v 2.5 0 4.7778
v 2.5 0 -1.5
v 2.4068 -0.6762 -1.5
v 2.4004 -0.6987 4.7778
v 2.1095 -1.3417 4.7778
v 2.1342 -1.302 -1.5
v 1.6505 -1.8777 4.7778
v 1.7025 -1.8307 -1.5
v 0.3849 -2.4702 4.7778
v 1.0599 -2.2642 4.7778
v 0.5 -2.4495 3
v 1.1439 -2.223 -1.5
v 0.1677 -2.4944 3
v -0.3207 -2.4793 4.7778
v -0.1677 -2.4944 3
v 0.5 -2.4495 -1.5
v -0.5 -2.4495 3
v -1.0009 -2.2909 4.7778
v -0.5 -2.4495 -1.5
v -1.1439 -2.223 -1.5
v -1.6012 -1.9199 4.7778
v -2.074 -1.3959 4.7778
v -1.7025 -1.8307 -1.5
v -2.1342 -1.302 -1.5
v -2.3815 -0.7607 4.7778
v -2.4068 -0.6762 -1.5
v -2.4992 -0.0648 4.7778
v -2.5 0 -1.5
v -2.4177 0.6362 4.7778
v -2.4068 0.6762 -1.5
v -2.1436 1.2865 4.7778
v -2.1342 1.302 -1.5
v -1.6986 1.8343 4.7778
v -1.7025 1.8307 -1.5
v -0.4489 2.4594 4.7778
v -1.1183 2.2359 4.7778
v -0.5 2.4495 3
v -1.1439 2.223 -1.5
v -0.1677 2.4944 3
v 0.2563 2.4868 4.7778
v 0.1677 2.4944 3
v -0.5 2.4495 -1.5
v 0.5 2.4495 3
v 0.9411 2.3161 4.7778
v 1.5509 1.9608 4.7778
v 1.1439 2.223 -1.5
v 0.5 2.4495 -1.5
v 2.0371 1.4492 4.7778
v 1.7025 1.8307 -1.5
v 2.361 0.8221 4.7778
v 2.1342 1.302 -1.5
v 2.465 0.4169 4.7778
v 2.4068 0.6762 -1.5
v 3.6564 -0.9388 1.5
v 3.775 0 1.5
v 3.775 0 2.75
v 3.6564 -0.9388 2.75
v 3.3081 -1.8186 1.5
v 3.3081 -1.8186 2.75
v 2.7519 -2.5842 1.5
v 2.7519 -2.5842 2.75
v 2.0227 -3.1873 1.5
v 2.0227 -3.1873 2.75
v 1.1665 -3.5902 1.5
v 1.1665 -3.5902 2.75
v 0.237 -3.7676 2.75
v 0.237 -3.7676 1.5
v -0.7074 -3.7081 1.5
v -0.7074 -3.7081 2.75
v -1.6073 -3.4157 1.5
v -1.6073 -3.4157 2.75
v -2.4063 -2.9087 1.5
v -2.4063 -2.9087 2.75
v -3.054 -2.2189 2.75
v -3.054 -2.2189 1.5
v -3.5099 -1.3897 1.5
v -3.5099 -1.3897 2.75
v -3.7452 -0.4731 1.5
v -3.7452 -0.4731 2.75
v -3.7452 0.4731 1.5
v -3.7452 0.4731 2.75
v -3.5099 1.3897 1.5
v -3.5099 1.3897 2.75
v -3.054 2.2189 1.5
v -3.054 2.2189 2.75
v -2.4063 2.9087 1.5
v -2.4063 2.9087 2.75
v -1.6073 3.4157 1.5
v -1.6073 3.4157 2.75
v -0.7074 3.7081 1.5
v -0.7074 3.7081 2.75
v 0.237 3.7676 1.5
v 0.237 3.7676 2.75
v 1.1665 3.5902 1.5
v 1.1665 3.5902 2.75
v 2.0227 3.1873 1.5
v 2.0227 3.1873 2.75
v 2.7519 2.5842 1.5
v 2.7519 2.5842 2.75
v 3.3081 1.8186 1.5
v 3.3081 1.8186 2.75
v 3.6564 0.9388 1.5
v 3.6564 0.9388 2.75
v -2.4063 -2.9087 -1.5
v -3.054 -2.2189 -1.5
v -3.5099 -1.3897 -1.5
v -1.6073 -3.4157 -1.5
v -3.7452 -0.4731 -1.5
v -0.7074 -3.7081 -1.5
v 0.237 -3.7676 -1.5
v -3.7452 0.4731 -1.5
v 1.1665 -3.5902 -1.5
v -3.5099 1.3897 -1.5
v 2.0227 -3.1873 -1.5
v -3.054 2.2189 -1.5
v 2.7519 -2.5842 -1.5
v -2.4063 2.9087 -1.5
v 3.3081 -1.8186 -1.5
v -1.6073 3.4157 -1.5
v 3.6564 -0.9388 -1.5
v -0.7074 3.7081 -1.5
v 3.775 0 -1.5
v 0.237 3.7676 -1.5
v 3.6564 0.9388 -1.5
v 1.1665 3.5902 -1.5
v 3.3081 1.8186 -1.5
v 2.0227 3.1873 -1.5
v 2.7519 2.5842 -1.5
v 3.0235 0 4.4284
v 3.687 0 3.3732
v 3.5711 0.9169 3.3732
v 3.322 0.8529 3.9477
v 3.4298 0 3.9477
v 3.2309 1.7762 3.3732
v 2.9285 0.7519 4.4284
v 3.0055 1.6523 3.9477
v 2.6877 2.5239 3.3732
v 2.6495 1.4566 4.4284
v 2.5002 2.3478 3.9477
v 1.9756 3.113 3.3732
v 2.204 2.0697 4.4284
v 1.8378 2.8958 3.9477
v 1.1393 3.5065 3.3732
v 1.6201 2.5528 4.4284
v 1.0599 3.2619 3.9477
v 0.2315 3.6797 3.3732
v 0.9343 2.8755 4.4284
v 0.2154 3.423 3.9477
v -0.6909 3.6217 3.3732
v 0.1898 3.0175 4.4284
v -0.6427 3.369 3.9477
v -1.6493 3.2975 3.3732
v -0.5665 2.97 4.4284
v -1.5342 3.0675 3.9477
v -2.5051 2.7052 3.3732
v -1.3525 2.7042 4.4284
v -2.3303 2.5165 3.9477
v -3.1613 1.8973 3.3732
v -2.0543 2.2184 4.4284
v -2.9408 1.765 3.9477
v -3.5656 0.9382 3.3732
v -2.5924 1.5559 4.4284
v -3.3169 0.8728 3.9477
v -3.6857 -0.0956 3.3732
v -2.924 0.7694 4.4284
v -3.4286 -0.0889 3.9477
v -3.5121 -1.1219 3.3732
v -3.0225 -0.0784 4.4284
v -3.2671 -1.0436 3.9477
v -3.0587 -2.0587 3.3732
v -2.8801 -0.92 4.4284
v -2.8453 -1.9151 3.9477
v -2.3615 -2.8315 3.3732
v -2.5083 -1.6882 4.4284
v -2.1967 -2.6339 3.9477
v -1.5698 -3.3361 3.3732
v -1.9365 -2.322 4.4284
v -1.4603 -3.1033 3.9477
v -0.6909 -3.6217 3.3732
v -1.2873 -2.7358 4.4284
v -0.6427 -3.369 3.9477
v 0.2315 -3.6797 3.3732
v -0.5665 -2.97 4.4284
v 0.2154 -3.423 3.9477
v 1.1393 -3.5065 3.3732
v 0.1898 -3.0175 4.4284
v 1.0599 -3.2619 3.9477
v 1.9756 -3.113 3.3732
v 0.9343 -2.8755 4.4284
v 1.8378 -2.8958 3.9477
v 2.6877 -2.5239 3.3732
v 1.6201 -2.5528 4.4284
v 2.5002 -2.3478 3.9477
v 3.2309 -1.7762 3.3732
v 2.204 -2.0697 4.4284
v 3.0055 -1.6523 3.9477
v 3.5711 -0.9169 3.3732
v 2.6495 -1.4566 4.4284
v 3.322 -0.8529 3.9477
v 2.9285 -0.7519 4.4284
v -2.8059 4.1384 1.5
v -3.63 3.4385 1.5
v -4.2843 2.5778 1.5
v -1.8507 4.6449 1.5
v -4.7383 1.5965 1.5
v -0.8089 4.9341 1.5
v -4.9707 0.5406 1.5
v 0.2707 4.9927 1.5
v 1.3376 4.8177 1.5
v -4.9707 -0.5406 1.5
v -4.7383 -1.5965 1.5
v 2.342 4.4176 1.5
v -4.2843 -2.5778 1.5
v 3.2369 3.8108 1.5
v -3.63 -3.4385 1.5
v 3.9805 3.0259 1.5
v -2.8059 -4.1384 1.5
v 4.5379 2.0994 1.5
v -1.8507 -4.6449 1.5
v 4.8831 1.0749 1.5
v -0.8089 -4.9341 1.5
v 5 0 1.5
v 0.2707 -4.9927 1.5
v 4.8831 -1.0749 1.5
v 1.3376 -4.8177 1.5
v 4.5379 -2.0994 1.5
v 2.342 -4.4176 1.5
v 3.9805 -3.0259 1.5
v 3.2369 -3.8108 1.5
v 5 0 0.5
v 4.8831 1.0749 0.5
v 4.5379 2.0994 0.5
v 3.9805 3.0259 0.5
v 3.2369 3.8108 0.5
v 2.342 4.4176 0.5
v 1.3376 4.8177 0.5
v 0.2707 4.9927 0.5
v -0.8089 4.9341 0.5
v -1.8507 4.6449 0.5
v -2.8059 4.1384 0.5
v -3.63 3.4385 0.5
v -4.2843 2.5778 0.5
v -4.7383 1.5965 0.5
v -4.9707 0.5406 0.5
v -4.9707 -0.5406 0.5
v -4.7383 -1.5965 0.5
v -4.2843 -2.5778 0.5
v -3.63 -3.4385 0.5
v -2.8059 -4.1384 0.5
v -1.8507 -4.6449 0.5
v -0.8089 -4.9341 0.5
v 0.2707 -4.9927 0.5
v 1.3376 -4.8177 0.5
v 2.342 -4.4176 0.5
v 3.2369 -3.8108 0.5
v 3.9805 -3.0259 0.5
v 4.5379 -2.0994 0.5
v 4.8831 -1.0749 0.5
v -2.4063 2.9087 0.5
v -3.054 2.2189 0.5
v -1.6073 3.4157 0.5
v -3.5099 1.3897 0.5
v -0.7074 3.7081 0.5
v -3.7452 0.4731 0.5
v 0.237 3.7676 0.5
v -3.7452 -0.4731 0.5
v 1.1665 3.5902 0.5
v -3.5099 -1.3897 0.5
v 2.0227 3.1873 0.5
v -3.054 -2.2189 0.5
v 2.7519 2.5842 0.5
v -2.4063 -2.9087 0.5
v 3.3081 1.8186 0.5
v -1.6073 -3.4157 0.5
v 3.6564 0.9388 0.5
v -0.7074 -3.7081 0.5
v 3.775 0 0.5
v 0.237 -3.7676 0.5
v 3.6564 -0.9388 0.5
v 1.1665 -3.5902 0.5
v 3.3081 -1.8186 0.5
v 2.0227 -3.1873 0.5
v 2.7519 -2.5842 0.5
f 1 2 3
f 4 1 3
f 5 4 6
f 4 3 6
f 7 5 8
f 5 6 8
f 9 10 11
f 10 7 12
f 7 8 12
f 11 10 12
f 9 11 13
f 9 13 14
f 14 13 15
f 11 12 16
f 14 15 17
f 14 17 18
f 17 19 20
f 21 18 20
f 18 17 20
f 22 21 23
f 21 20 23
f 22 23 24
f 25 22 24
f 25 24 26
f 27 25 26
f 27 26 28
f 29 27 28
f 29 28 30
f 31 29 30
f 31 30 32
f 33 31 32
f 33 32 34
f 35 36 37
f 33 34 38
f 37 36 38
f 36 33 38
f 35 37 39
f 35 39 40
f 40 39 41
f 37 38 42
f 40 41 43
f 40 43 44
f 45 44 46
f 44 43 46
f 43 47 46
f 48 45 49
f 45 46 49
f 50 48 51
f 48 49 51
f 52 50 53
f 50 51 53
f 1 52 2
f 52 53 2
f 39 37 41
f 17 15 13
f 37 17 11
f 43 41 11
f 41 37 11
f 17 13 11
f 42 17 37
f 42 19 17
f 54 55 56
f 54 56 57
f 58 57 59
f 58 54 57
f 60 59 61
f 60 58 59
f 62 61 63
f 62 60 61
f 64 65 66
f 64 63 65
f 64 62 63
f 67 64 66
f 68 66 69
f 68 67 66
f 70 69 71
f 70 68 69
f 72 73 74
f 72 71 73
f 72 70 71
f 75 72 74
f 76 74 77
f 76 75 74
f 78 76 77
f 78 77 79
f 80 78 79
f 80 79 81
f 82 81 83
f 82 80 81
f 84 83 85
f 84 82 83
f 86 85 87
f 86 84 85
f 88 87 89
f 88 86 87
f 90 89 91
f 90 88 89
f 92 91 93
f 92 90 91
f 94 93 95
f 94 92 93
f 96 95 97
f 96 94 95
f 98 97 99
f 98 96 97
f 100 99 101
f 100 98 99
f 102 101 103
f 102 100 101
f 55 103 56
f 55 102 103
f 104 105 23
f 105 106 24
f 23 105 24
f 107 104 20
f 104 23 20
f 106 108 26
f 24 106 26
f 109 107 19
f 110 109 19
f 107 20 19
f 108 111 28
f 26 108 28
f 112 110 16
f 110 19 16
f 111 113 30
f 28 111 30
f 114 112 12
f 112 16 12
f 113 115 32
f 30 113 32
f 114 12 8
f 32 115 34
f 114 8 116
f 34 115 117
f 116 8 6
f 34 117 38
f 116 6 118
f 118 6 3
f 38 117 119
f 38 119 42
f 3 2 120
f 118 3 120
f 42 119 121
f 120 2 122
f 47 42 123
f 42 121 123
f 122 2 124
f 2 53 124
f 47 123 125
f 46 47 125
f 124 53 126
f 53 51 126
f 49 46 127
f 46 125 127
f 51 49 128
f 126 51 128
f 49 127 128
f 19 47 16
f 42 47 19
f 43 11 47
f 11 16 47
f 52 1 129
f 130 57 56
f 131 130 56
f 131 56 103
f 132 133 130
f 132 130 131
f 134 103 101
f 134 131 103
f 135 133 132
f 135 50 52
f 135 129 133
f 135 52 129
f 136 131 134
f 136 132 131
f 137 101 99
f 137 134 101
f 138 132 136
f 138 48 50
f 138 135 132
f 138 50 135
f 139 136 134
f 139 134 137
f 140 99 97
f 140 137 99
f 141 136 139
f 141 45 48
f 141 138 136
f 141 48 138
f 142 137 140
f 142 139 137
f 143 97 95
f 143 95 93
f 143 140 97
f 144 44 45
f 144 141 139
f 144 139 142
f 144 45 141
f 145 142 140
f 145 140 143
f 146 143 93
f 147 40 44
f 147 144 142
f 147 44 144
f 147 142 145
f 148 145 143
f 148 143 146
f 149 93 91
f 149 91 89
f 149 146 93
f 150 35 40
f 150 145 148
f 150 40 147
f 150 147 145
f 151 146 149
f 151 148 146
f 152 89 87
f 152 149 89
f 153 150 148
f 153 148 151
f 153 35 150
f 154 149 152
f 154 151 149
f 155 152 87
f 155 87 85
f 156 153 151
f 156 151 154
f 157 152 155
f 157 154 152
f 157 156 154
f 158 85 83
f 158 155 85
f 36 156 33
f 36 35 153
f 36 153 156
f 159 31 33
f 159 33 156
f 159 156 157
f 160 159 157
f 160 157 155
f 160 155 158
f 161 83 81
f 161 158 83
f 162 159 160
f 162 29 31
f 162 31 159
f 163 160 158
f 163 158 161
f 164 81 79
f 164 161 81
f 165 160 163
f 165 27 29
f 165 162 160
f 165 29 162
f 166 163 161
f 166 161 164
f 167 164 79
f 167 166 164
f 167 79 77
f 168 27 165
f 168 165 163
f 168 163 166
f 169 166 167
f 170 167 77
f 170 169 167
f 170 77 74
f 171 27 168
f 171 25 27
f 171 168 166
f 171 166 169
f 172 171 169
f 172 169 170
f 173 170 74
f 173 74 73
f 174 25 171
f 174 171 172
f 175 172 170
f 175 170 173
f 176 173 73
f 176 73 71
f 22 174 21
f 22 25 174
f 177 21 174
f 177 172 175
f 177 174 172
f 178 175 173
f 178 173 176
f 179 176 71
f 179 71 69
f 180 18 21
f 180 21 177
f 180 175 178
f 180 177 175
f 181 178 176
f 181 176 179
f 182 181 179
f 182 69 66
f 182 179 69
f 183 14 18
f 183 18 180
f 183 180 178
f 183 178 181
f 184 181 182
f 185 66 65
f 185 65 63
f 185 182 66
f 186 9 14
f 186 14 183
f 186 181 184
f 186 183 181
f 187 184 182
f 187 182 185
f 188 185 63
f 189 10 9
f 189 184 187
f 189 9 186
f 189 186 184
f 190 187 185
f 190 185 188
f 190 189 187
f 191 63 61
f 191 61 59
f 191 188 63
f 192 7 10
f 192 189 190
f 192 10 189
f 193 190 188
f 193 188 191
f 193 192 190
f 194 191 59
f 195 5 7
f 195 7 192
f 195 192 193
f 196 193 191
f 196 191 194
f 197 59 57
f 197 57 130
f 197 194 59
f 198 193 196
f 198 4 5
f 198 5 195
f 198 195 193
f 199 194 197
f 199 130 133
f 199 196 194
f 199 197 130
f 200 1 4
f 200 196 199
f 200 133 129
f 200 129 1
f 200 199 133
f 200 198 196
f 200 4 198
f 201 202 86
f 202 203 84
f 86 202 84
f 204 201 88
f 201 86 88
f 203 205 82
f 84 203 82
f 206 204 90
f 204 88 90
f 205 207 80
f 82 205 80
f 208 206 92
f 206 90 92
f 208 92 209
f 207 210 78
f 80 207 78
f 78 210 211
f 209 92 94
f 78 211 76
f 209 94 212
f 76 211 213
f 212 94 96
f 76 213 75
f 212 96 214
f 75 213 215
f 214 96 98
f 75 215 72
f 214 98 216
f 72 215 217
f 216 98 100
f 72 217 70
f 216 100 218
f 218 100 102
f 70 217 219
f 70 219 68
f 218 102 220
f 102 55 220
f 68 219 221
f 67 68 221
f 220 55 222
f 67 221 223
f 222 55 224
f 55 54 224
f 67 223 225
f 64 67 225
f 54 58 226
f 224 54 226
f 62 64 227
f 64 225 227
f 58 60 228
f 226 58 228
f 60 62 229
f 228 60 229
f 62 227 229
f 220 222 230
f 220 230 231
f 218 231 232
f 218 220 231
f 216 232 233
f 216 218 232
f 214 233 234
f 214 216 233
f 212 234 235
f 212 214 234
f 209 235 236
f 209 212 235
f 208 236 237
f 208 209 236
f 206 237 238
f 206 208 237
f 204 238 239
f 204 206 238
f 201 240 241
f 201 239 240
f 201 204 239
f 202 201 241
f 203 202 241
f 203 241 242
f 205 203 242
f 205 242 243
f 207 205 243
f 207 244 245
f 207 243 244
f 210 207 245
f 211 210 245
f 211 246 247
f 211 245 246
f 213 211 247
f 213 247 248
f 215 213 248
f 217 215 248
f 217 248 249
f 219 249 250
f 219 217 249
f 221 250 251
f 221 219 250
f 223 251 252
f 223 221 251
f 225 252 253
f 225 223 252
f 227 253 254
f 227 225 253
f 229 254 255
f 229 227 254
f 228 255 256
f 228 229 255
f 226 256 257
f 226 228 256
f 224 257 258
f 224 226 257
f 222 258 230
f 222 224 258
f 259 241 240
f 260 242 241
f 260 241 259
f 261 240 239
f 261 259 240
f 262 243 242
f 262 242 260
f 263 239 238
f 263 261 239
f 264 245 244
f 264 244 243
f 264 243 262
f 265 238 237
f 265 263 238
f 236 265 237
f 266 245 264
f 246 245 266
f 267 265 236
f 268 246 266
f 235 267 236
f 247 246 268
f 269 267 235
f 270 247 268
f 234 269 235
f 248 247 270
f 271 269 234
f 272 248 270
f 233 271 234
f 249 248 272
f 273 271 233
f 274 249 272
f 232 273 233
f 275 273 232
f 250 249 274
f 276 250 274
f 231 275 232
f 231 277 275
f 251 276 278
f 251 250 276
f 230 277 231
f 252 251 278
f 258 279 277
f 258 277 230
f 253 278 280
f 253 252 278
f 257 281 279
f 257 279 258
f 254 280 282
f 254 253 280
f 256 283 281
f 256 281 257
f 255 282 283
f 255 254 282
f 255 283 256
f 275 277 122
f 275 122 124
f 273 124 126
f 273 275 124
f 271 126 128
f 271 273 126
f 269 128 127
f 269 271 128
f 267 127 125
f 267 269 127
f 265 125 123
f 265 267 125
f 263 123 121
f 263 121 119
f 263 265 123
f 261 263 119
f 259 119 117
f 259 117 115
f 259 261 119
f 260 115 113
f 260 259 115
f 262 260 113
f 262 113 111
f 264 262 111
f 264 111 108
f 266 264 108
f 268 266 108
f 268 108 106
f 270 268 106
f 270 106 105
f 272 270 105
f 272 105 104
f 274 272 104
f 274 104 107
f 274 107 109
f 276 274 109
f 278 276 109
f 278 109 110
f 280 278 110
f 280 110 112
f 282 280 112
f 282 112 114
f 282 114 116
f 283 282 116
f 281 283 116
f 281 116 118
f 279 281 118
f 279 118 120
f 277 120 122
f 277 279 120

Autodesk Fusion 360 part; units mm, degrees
sketch "Sketch1" plane through (0, 0, 0) normal (0, 0, 1) x (1, 0, 0)
  circle A0 centre (0, 0) radius 3.775
  circle A1 centre (0, 0) radius 1.5
  dimension "d1" = 7.55
  dimension "d2" = 3
extrude "Extrude1" add sketch "Sketch1" along normal blind 5 makes body 1
fillet "Fillet1" radius 2.25 1 edges at (-3.5195, -1.3651, 5) on bodies 1
sketch "Sketch2" plane through (0, 0, 0) normal (0, 0, -1) x (1, 0, 0)
  circle A0 centre (0, 0) radius 1.5
  circle A1 centre (0, 0) radius 3.775
  circle A2 centre (0, 0) radius 2
  dimension "d7" = 4
extrude "Extrude2" cut sketch "Sketch2" against normal blind 13.5 contours A2 bodies 1
extrude "Extrude3" cut 1 faces at (3.1618, -0.2869, 0) along direction (0, 0, 1) blind 1.5 on bodies 1 bodies 1
sketch "Sketch3" plane through (0, 0, 1.5) normal (0, 0, -1) x (1, 0, 0)
  circle A0 centre (0, 0) radius 2
  circle A1 centre (0, 0) radius 3.775
  circle A2 centre (0, 0) radius 5
  dimension "d12" = 10
extrude "Extrude4" add sketch "Sketch3" along normal blind 1 separate body contours A2 makes body 2
extrude "Extrude5" add 1 faces at (3.1618, -0.2869, 1.5) along direction (0, 0, -1) blind 3 on bodies 1 bodies 1 2
sketch "Sketch4" plane through (0, 0, -1.5) normal (0, 0, -1) x (1, 0, 0)
  circle A0 centre (0, 0) radius 2
  circle A1 centre (0, 0) radius 3.775
  circle A2 centre (0, 0) radius 2.5
  dimension "d17" = 5
extrude "Extrude6" cut sketch "Sketch4" against normal blind 12.5 contours A2 bodies 1
sketch "Sketch5" plane through (0, 0, -1.5) normal (0, 0, -1) x (1, 0, 0)
  circle A0 centre (0, 0) radius 2.5
  circle A1 centre (0, 0) radius 3.775
  line L0 (0, 3.5) -> (0, -3.5) construction
  line L1 (0.5, 3.5) -> (0.5, -3.5)
  line L2 (-0.5, 3.5) -> (-0.5, -3.5)
  dimension "d20" = -0.5
  dimension "d21" = 0.5
extrude "Extrude7" add sketch "Sketch5" against normal blind 4.5 contours A0 L1 L2 bodies 1
